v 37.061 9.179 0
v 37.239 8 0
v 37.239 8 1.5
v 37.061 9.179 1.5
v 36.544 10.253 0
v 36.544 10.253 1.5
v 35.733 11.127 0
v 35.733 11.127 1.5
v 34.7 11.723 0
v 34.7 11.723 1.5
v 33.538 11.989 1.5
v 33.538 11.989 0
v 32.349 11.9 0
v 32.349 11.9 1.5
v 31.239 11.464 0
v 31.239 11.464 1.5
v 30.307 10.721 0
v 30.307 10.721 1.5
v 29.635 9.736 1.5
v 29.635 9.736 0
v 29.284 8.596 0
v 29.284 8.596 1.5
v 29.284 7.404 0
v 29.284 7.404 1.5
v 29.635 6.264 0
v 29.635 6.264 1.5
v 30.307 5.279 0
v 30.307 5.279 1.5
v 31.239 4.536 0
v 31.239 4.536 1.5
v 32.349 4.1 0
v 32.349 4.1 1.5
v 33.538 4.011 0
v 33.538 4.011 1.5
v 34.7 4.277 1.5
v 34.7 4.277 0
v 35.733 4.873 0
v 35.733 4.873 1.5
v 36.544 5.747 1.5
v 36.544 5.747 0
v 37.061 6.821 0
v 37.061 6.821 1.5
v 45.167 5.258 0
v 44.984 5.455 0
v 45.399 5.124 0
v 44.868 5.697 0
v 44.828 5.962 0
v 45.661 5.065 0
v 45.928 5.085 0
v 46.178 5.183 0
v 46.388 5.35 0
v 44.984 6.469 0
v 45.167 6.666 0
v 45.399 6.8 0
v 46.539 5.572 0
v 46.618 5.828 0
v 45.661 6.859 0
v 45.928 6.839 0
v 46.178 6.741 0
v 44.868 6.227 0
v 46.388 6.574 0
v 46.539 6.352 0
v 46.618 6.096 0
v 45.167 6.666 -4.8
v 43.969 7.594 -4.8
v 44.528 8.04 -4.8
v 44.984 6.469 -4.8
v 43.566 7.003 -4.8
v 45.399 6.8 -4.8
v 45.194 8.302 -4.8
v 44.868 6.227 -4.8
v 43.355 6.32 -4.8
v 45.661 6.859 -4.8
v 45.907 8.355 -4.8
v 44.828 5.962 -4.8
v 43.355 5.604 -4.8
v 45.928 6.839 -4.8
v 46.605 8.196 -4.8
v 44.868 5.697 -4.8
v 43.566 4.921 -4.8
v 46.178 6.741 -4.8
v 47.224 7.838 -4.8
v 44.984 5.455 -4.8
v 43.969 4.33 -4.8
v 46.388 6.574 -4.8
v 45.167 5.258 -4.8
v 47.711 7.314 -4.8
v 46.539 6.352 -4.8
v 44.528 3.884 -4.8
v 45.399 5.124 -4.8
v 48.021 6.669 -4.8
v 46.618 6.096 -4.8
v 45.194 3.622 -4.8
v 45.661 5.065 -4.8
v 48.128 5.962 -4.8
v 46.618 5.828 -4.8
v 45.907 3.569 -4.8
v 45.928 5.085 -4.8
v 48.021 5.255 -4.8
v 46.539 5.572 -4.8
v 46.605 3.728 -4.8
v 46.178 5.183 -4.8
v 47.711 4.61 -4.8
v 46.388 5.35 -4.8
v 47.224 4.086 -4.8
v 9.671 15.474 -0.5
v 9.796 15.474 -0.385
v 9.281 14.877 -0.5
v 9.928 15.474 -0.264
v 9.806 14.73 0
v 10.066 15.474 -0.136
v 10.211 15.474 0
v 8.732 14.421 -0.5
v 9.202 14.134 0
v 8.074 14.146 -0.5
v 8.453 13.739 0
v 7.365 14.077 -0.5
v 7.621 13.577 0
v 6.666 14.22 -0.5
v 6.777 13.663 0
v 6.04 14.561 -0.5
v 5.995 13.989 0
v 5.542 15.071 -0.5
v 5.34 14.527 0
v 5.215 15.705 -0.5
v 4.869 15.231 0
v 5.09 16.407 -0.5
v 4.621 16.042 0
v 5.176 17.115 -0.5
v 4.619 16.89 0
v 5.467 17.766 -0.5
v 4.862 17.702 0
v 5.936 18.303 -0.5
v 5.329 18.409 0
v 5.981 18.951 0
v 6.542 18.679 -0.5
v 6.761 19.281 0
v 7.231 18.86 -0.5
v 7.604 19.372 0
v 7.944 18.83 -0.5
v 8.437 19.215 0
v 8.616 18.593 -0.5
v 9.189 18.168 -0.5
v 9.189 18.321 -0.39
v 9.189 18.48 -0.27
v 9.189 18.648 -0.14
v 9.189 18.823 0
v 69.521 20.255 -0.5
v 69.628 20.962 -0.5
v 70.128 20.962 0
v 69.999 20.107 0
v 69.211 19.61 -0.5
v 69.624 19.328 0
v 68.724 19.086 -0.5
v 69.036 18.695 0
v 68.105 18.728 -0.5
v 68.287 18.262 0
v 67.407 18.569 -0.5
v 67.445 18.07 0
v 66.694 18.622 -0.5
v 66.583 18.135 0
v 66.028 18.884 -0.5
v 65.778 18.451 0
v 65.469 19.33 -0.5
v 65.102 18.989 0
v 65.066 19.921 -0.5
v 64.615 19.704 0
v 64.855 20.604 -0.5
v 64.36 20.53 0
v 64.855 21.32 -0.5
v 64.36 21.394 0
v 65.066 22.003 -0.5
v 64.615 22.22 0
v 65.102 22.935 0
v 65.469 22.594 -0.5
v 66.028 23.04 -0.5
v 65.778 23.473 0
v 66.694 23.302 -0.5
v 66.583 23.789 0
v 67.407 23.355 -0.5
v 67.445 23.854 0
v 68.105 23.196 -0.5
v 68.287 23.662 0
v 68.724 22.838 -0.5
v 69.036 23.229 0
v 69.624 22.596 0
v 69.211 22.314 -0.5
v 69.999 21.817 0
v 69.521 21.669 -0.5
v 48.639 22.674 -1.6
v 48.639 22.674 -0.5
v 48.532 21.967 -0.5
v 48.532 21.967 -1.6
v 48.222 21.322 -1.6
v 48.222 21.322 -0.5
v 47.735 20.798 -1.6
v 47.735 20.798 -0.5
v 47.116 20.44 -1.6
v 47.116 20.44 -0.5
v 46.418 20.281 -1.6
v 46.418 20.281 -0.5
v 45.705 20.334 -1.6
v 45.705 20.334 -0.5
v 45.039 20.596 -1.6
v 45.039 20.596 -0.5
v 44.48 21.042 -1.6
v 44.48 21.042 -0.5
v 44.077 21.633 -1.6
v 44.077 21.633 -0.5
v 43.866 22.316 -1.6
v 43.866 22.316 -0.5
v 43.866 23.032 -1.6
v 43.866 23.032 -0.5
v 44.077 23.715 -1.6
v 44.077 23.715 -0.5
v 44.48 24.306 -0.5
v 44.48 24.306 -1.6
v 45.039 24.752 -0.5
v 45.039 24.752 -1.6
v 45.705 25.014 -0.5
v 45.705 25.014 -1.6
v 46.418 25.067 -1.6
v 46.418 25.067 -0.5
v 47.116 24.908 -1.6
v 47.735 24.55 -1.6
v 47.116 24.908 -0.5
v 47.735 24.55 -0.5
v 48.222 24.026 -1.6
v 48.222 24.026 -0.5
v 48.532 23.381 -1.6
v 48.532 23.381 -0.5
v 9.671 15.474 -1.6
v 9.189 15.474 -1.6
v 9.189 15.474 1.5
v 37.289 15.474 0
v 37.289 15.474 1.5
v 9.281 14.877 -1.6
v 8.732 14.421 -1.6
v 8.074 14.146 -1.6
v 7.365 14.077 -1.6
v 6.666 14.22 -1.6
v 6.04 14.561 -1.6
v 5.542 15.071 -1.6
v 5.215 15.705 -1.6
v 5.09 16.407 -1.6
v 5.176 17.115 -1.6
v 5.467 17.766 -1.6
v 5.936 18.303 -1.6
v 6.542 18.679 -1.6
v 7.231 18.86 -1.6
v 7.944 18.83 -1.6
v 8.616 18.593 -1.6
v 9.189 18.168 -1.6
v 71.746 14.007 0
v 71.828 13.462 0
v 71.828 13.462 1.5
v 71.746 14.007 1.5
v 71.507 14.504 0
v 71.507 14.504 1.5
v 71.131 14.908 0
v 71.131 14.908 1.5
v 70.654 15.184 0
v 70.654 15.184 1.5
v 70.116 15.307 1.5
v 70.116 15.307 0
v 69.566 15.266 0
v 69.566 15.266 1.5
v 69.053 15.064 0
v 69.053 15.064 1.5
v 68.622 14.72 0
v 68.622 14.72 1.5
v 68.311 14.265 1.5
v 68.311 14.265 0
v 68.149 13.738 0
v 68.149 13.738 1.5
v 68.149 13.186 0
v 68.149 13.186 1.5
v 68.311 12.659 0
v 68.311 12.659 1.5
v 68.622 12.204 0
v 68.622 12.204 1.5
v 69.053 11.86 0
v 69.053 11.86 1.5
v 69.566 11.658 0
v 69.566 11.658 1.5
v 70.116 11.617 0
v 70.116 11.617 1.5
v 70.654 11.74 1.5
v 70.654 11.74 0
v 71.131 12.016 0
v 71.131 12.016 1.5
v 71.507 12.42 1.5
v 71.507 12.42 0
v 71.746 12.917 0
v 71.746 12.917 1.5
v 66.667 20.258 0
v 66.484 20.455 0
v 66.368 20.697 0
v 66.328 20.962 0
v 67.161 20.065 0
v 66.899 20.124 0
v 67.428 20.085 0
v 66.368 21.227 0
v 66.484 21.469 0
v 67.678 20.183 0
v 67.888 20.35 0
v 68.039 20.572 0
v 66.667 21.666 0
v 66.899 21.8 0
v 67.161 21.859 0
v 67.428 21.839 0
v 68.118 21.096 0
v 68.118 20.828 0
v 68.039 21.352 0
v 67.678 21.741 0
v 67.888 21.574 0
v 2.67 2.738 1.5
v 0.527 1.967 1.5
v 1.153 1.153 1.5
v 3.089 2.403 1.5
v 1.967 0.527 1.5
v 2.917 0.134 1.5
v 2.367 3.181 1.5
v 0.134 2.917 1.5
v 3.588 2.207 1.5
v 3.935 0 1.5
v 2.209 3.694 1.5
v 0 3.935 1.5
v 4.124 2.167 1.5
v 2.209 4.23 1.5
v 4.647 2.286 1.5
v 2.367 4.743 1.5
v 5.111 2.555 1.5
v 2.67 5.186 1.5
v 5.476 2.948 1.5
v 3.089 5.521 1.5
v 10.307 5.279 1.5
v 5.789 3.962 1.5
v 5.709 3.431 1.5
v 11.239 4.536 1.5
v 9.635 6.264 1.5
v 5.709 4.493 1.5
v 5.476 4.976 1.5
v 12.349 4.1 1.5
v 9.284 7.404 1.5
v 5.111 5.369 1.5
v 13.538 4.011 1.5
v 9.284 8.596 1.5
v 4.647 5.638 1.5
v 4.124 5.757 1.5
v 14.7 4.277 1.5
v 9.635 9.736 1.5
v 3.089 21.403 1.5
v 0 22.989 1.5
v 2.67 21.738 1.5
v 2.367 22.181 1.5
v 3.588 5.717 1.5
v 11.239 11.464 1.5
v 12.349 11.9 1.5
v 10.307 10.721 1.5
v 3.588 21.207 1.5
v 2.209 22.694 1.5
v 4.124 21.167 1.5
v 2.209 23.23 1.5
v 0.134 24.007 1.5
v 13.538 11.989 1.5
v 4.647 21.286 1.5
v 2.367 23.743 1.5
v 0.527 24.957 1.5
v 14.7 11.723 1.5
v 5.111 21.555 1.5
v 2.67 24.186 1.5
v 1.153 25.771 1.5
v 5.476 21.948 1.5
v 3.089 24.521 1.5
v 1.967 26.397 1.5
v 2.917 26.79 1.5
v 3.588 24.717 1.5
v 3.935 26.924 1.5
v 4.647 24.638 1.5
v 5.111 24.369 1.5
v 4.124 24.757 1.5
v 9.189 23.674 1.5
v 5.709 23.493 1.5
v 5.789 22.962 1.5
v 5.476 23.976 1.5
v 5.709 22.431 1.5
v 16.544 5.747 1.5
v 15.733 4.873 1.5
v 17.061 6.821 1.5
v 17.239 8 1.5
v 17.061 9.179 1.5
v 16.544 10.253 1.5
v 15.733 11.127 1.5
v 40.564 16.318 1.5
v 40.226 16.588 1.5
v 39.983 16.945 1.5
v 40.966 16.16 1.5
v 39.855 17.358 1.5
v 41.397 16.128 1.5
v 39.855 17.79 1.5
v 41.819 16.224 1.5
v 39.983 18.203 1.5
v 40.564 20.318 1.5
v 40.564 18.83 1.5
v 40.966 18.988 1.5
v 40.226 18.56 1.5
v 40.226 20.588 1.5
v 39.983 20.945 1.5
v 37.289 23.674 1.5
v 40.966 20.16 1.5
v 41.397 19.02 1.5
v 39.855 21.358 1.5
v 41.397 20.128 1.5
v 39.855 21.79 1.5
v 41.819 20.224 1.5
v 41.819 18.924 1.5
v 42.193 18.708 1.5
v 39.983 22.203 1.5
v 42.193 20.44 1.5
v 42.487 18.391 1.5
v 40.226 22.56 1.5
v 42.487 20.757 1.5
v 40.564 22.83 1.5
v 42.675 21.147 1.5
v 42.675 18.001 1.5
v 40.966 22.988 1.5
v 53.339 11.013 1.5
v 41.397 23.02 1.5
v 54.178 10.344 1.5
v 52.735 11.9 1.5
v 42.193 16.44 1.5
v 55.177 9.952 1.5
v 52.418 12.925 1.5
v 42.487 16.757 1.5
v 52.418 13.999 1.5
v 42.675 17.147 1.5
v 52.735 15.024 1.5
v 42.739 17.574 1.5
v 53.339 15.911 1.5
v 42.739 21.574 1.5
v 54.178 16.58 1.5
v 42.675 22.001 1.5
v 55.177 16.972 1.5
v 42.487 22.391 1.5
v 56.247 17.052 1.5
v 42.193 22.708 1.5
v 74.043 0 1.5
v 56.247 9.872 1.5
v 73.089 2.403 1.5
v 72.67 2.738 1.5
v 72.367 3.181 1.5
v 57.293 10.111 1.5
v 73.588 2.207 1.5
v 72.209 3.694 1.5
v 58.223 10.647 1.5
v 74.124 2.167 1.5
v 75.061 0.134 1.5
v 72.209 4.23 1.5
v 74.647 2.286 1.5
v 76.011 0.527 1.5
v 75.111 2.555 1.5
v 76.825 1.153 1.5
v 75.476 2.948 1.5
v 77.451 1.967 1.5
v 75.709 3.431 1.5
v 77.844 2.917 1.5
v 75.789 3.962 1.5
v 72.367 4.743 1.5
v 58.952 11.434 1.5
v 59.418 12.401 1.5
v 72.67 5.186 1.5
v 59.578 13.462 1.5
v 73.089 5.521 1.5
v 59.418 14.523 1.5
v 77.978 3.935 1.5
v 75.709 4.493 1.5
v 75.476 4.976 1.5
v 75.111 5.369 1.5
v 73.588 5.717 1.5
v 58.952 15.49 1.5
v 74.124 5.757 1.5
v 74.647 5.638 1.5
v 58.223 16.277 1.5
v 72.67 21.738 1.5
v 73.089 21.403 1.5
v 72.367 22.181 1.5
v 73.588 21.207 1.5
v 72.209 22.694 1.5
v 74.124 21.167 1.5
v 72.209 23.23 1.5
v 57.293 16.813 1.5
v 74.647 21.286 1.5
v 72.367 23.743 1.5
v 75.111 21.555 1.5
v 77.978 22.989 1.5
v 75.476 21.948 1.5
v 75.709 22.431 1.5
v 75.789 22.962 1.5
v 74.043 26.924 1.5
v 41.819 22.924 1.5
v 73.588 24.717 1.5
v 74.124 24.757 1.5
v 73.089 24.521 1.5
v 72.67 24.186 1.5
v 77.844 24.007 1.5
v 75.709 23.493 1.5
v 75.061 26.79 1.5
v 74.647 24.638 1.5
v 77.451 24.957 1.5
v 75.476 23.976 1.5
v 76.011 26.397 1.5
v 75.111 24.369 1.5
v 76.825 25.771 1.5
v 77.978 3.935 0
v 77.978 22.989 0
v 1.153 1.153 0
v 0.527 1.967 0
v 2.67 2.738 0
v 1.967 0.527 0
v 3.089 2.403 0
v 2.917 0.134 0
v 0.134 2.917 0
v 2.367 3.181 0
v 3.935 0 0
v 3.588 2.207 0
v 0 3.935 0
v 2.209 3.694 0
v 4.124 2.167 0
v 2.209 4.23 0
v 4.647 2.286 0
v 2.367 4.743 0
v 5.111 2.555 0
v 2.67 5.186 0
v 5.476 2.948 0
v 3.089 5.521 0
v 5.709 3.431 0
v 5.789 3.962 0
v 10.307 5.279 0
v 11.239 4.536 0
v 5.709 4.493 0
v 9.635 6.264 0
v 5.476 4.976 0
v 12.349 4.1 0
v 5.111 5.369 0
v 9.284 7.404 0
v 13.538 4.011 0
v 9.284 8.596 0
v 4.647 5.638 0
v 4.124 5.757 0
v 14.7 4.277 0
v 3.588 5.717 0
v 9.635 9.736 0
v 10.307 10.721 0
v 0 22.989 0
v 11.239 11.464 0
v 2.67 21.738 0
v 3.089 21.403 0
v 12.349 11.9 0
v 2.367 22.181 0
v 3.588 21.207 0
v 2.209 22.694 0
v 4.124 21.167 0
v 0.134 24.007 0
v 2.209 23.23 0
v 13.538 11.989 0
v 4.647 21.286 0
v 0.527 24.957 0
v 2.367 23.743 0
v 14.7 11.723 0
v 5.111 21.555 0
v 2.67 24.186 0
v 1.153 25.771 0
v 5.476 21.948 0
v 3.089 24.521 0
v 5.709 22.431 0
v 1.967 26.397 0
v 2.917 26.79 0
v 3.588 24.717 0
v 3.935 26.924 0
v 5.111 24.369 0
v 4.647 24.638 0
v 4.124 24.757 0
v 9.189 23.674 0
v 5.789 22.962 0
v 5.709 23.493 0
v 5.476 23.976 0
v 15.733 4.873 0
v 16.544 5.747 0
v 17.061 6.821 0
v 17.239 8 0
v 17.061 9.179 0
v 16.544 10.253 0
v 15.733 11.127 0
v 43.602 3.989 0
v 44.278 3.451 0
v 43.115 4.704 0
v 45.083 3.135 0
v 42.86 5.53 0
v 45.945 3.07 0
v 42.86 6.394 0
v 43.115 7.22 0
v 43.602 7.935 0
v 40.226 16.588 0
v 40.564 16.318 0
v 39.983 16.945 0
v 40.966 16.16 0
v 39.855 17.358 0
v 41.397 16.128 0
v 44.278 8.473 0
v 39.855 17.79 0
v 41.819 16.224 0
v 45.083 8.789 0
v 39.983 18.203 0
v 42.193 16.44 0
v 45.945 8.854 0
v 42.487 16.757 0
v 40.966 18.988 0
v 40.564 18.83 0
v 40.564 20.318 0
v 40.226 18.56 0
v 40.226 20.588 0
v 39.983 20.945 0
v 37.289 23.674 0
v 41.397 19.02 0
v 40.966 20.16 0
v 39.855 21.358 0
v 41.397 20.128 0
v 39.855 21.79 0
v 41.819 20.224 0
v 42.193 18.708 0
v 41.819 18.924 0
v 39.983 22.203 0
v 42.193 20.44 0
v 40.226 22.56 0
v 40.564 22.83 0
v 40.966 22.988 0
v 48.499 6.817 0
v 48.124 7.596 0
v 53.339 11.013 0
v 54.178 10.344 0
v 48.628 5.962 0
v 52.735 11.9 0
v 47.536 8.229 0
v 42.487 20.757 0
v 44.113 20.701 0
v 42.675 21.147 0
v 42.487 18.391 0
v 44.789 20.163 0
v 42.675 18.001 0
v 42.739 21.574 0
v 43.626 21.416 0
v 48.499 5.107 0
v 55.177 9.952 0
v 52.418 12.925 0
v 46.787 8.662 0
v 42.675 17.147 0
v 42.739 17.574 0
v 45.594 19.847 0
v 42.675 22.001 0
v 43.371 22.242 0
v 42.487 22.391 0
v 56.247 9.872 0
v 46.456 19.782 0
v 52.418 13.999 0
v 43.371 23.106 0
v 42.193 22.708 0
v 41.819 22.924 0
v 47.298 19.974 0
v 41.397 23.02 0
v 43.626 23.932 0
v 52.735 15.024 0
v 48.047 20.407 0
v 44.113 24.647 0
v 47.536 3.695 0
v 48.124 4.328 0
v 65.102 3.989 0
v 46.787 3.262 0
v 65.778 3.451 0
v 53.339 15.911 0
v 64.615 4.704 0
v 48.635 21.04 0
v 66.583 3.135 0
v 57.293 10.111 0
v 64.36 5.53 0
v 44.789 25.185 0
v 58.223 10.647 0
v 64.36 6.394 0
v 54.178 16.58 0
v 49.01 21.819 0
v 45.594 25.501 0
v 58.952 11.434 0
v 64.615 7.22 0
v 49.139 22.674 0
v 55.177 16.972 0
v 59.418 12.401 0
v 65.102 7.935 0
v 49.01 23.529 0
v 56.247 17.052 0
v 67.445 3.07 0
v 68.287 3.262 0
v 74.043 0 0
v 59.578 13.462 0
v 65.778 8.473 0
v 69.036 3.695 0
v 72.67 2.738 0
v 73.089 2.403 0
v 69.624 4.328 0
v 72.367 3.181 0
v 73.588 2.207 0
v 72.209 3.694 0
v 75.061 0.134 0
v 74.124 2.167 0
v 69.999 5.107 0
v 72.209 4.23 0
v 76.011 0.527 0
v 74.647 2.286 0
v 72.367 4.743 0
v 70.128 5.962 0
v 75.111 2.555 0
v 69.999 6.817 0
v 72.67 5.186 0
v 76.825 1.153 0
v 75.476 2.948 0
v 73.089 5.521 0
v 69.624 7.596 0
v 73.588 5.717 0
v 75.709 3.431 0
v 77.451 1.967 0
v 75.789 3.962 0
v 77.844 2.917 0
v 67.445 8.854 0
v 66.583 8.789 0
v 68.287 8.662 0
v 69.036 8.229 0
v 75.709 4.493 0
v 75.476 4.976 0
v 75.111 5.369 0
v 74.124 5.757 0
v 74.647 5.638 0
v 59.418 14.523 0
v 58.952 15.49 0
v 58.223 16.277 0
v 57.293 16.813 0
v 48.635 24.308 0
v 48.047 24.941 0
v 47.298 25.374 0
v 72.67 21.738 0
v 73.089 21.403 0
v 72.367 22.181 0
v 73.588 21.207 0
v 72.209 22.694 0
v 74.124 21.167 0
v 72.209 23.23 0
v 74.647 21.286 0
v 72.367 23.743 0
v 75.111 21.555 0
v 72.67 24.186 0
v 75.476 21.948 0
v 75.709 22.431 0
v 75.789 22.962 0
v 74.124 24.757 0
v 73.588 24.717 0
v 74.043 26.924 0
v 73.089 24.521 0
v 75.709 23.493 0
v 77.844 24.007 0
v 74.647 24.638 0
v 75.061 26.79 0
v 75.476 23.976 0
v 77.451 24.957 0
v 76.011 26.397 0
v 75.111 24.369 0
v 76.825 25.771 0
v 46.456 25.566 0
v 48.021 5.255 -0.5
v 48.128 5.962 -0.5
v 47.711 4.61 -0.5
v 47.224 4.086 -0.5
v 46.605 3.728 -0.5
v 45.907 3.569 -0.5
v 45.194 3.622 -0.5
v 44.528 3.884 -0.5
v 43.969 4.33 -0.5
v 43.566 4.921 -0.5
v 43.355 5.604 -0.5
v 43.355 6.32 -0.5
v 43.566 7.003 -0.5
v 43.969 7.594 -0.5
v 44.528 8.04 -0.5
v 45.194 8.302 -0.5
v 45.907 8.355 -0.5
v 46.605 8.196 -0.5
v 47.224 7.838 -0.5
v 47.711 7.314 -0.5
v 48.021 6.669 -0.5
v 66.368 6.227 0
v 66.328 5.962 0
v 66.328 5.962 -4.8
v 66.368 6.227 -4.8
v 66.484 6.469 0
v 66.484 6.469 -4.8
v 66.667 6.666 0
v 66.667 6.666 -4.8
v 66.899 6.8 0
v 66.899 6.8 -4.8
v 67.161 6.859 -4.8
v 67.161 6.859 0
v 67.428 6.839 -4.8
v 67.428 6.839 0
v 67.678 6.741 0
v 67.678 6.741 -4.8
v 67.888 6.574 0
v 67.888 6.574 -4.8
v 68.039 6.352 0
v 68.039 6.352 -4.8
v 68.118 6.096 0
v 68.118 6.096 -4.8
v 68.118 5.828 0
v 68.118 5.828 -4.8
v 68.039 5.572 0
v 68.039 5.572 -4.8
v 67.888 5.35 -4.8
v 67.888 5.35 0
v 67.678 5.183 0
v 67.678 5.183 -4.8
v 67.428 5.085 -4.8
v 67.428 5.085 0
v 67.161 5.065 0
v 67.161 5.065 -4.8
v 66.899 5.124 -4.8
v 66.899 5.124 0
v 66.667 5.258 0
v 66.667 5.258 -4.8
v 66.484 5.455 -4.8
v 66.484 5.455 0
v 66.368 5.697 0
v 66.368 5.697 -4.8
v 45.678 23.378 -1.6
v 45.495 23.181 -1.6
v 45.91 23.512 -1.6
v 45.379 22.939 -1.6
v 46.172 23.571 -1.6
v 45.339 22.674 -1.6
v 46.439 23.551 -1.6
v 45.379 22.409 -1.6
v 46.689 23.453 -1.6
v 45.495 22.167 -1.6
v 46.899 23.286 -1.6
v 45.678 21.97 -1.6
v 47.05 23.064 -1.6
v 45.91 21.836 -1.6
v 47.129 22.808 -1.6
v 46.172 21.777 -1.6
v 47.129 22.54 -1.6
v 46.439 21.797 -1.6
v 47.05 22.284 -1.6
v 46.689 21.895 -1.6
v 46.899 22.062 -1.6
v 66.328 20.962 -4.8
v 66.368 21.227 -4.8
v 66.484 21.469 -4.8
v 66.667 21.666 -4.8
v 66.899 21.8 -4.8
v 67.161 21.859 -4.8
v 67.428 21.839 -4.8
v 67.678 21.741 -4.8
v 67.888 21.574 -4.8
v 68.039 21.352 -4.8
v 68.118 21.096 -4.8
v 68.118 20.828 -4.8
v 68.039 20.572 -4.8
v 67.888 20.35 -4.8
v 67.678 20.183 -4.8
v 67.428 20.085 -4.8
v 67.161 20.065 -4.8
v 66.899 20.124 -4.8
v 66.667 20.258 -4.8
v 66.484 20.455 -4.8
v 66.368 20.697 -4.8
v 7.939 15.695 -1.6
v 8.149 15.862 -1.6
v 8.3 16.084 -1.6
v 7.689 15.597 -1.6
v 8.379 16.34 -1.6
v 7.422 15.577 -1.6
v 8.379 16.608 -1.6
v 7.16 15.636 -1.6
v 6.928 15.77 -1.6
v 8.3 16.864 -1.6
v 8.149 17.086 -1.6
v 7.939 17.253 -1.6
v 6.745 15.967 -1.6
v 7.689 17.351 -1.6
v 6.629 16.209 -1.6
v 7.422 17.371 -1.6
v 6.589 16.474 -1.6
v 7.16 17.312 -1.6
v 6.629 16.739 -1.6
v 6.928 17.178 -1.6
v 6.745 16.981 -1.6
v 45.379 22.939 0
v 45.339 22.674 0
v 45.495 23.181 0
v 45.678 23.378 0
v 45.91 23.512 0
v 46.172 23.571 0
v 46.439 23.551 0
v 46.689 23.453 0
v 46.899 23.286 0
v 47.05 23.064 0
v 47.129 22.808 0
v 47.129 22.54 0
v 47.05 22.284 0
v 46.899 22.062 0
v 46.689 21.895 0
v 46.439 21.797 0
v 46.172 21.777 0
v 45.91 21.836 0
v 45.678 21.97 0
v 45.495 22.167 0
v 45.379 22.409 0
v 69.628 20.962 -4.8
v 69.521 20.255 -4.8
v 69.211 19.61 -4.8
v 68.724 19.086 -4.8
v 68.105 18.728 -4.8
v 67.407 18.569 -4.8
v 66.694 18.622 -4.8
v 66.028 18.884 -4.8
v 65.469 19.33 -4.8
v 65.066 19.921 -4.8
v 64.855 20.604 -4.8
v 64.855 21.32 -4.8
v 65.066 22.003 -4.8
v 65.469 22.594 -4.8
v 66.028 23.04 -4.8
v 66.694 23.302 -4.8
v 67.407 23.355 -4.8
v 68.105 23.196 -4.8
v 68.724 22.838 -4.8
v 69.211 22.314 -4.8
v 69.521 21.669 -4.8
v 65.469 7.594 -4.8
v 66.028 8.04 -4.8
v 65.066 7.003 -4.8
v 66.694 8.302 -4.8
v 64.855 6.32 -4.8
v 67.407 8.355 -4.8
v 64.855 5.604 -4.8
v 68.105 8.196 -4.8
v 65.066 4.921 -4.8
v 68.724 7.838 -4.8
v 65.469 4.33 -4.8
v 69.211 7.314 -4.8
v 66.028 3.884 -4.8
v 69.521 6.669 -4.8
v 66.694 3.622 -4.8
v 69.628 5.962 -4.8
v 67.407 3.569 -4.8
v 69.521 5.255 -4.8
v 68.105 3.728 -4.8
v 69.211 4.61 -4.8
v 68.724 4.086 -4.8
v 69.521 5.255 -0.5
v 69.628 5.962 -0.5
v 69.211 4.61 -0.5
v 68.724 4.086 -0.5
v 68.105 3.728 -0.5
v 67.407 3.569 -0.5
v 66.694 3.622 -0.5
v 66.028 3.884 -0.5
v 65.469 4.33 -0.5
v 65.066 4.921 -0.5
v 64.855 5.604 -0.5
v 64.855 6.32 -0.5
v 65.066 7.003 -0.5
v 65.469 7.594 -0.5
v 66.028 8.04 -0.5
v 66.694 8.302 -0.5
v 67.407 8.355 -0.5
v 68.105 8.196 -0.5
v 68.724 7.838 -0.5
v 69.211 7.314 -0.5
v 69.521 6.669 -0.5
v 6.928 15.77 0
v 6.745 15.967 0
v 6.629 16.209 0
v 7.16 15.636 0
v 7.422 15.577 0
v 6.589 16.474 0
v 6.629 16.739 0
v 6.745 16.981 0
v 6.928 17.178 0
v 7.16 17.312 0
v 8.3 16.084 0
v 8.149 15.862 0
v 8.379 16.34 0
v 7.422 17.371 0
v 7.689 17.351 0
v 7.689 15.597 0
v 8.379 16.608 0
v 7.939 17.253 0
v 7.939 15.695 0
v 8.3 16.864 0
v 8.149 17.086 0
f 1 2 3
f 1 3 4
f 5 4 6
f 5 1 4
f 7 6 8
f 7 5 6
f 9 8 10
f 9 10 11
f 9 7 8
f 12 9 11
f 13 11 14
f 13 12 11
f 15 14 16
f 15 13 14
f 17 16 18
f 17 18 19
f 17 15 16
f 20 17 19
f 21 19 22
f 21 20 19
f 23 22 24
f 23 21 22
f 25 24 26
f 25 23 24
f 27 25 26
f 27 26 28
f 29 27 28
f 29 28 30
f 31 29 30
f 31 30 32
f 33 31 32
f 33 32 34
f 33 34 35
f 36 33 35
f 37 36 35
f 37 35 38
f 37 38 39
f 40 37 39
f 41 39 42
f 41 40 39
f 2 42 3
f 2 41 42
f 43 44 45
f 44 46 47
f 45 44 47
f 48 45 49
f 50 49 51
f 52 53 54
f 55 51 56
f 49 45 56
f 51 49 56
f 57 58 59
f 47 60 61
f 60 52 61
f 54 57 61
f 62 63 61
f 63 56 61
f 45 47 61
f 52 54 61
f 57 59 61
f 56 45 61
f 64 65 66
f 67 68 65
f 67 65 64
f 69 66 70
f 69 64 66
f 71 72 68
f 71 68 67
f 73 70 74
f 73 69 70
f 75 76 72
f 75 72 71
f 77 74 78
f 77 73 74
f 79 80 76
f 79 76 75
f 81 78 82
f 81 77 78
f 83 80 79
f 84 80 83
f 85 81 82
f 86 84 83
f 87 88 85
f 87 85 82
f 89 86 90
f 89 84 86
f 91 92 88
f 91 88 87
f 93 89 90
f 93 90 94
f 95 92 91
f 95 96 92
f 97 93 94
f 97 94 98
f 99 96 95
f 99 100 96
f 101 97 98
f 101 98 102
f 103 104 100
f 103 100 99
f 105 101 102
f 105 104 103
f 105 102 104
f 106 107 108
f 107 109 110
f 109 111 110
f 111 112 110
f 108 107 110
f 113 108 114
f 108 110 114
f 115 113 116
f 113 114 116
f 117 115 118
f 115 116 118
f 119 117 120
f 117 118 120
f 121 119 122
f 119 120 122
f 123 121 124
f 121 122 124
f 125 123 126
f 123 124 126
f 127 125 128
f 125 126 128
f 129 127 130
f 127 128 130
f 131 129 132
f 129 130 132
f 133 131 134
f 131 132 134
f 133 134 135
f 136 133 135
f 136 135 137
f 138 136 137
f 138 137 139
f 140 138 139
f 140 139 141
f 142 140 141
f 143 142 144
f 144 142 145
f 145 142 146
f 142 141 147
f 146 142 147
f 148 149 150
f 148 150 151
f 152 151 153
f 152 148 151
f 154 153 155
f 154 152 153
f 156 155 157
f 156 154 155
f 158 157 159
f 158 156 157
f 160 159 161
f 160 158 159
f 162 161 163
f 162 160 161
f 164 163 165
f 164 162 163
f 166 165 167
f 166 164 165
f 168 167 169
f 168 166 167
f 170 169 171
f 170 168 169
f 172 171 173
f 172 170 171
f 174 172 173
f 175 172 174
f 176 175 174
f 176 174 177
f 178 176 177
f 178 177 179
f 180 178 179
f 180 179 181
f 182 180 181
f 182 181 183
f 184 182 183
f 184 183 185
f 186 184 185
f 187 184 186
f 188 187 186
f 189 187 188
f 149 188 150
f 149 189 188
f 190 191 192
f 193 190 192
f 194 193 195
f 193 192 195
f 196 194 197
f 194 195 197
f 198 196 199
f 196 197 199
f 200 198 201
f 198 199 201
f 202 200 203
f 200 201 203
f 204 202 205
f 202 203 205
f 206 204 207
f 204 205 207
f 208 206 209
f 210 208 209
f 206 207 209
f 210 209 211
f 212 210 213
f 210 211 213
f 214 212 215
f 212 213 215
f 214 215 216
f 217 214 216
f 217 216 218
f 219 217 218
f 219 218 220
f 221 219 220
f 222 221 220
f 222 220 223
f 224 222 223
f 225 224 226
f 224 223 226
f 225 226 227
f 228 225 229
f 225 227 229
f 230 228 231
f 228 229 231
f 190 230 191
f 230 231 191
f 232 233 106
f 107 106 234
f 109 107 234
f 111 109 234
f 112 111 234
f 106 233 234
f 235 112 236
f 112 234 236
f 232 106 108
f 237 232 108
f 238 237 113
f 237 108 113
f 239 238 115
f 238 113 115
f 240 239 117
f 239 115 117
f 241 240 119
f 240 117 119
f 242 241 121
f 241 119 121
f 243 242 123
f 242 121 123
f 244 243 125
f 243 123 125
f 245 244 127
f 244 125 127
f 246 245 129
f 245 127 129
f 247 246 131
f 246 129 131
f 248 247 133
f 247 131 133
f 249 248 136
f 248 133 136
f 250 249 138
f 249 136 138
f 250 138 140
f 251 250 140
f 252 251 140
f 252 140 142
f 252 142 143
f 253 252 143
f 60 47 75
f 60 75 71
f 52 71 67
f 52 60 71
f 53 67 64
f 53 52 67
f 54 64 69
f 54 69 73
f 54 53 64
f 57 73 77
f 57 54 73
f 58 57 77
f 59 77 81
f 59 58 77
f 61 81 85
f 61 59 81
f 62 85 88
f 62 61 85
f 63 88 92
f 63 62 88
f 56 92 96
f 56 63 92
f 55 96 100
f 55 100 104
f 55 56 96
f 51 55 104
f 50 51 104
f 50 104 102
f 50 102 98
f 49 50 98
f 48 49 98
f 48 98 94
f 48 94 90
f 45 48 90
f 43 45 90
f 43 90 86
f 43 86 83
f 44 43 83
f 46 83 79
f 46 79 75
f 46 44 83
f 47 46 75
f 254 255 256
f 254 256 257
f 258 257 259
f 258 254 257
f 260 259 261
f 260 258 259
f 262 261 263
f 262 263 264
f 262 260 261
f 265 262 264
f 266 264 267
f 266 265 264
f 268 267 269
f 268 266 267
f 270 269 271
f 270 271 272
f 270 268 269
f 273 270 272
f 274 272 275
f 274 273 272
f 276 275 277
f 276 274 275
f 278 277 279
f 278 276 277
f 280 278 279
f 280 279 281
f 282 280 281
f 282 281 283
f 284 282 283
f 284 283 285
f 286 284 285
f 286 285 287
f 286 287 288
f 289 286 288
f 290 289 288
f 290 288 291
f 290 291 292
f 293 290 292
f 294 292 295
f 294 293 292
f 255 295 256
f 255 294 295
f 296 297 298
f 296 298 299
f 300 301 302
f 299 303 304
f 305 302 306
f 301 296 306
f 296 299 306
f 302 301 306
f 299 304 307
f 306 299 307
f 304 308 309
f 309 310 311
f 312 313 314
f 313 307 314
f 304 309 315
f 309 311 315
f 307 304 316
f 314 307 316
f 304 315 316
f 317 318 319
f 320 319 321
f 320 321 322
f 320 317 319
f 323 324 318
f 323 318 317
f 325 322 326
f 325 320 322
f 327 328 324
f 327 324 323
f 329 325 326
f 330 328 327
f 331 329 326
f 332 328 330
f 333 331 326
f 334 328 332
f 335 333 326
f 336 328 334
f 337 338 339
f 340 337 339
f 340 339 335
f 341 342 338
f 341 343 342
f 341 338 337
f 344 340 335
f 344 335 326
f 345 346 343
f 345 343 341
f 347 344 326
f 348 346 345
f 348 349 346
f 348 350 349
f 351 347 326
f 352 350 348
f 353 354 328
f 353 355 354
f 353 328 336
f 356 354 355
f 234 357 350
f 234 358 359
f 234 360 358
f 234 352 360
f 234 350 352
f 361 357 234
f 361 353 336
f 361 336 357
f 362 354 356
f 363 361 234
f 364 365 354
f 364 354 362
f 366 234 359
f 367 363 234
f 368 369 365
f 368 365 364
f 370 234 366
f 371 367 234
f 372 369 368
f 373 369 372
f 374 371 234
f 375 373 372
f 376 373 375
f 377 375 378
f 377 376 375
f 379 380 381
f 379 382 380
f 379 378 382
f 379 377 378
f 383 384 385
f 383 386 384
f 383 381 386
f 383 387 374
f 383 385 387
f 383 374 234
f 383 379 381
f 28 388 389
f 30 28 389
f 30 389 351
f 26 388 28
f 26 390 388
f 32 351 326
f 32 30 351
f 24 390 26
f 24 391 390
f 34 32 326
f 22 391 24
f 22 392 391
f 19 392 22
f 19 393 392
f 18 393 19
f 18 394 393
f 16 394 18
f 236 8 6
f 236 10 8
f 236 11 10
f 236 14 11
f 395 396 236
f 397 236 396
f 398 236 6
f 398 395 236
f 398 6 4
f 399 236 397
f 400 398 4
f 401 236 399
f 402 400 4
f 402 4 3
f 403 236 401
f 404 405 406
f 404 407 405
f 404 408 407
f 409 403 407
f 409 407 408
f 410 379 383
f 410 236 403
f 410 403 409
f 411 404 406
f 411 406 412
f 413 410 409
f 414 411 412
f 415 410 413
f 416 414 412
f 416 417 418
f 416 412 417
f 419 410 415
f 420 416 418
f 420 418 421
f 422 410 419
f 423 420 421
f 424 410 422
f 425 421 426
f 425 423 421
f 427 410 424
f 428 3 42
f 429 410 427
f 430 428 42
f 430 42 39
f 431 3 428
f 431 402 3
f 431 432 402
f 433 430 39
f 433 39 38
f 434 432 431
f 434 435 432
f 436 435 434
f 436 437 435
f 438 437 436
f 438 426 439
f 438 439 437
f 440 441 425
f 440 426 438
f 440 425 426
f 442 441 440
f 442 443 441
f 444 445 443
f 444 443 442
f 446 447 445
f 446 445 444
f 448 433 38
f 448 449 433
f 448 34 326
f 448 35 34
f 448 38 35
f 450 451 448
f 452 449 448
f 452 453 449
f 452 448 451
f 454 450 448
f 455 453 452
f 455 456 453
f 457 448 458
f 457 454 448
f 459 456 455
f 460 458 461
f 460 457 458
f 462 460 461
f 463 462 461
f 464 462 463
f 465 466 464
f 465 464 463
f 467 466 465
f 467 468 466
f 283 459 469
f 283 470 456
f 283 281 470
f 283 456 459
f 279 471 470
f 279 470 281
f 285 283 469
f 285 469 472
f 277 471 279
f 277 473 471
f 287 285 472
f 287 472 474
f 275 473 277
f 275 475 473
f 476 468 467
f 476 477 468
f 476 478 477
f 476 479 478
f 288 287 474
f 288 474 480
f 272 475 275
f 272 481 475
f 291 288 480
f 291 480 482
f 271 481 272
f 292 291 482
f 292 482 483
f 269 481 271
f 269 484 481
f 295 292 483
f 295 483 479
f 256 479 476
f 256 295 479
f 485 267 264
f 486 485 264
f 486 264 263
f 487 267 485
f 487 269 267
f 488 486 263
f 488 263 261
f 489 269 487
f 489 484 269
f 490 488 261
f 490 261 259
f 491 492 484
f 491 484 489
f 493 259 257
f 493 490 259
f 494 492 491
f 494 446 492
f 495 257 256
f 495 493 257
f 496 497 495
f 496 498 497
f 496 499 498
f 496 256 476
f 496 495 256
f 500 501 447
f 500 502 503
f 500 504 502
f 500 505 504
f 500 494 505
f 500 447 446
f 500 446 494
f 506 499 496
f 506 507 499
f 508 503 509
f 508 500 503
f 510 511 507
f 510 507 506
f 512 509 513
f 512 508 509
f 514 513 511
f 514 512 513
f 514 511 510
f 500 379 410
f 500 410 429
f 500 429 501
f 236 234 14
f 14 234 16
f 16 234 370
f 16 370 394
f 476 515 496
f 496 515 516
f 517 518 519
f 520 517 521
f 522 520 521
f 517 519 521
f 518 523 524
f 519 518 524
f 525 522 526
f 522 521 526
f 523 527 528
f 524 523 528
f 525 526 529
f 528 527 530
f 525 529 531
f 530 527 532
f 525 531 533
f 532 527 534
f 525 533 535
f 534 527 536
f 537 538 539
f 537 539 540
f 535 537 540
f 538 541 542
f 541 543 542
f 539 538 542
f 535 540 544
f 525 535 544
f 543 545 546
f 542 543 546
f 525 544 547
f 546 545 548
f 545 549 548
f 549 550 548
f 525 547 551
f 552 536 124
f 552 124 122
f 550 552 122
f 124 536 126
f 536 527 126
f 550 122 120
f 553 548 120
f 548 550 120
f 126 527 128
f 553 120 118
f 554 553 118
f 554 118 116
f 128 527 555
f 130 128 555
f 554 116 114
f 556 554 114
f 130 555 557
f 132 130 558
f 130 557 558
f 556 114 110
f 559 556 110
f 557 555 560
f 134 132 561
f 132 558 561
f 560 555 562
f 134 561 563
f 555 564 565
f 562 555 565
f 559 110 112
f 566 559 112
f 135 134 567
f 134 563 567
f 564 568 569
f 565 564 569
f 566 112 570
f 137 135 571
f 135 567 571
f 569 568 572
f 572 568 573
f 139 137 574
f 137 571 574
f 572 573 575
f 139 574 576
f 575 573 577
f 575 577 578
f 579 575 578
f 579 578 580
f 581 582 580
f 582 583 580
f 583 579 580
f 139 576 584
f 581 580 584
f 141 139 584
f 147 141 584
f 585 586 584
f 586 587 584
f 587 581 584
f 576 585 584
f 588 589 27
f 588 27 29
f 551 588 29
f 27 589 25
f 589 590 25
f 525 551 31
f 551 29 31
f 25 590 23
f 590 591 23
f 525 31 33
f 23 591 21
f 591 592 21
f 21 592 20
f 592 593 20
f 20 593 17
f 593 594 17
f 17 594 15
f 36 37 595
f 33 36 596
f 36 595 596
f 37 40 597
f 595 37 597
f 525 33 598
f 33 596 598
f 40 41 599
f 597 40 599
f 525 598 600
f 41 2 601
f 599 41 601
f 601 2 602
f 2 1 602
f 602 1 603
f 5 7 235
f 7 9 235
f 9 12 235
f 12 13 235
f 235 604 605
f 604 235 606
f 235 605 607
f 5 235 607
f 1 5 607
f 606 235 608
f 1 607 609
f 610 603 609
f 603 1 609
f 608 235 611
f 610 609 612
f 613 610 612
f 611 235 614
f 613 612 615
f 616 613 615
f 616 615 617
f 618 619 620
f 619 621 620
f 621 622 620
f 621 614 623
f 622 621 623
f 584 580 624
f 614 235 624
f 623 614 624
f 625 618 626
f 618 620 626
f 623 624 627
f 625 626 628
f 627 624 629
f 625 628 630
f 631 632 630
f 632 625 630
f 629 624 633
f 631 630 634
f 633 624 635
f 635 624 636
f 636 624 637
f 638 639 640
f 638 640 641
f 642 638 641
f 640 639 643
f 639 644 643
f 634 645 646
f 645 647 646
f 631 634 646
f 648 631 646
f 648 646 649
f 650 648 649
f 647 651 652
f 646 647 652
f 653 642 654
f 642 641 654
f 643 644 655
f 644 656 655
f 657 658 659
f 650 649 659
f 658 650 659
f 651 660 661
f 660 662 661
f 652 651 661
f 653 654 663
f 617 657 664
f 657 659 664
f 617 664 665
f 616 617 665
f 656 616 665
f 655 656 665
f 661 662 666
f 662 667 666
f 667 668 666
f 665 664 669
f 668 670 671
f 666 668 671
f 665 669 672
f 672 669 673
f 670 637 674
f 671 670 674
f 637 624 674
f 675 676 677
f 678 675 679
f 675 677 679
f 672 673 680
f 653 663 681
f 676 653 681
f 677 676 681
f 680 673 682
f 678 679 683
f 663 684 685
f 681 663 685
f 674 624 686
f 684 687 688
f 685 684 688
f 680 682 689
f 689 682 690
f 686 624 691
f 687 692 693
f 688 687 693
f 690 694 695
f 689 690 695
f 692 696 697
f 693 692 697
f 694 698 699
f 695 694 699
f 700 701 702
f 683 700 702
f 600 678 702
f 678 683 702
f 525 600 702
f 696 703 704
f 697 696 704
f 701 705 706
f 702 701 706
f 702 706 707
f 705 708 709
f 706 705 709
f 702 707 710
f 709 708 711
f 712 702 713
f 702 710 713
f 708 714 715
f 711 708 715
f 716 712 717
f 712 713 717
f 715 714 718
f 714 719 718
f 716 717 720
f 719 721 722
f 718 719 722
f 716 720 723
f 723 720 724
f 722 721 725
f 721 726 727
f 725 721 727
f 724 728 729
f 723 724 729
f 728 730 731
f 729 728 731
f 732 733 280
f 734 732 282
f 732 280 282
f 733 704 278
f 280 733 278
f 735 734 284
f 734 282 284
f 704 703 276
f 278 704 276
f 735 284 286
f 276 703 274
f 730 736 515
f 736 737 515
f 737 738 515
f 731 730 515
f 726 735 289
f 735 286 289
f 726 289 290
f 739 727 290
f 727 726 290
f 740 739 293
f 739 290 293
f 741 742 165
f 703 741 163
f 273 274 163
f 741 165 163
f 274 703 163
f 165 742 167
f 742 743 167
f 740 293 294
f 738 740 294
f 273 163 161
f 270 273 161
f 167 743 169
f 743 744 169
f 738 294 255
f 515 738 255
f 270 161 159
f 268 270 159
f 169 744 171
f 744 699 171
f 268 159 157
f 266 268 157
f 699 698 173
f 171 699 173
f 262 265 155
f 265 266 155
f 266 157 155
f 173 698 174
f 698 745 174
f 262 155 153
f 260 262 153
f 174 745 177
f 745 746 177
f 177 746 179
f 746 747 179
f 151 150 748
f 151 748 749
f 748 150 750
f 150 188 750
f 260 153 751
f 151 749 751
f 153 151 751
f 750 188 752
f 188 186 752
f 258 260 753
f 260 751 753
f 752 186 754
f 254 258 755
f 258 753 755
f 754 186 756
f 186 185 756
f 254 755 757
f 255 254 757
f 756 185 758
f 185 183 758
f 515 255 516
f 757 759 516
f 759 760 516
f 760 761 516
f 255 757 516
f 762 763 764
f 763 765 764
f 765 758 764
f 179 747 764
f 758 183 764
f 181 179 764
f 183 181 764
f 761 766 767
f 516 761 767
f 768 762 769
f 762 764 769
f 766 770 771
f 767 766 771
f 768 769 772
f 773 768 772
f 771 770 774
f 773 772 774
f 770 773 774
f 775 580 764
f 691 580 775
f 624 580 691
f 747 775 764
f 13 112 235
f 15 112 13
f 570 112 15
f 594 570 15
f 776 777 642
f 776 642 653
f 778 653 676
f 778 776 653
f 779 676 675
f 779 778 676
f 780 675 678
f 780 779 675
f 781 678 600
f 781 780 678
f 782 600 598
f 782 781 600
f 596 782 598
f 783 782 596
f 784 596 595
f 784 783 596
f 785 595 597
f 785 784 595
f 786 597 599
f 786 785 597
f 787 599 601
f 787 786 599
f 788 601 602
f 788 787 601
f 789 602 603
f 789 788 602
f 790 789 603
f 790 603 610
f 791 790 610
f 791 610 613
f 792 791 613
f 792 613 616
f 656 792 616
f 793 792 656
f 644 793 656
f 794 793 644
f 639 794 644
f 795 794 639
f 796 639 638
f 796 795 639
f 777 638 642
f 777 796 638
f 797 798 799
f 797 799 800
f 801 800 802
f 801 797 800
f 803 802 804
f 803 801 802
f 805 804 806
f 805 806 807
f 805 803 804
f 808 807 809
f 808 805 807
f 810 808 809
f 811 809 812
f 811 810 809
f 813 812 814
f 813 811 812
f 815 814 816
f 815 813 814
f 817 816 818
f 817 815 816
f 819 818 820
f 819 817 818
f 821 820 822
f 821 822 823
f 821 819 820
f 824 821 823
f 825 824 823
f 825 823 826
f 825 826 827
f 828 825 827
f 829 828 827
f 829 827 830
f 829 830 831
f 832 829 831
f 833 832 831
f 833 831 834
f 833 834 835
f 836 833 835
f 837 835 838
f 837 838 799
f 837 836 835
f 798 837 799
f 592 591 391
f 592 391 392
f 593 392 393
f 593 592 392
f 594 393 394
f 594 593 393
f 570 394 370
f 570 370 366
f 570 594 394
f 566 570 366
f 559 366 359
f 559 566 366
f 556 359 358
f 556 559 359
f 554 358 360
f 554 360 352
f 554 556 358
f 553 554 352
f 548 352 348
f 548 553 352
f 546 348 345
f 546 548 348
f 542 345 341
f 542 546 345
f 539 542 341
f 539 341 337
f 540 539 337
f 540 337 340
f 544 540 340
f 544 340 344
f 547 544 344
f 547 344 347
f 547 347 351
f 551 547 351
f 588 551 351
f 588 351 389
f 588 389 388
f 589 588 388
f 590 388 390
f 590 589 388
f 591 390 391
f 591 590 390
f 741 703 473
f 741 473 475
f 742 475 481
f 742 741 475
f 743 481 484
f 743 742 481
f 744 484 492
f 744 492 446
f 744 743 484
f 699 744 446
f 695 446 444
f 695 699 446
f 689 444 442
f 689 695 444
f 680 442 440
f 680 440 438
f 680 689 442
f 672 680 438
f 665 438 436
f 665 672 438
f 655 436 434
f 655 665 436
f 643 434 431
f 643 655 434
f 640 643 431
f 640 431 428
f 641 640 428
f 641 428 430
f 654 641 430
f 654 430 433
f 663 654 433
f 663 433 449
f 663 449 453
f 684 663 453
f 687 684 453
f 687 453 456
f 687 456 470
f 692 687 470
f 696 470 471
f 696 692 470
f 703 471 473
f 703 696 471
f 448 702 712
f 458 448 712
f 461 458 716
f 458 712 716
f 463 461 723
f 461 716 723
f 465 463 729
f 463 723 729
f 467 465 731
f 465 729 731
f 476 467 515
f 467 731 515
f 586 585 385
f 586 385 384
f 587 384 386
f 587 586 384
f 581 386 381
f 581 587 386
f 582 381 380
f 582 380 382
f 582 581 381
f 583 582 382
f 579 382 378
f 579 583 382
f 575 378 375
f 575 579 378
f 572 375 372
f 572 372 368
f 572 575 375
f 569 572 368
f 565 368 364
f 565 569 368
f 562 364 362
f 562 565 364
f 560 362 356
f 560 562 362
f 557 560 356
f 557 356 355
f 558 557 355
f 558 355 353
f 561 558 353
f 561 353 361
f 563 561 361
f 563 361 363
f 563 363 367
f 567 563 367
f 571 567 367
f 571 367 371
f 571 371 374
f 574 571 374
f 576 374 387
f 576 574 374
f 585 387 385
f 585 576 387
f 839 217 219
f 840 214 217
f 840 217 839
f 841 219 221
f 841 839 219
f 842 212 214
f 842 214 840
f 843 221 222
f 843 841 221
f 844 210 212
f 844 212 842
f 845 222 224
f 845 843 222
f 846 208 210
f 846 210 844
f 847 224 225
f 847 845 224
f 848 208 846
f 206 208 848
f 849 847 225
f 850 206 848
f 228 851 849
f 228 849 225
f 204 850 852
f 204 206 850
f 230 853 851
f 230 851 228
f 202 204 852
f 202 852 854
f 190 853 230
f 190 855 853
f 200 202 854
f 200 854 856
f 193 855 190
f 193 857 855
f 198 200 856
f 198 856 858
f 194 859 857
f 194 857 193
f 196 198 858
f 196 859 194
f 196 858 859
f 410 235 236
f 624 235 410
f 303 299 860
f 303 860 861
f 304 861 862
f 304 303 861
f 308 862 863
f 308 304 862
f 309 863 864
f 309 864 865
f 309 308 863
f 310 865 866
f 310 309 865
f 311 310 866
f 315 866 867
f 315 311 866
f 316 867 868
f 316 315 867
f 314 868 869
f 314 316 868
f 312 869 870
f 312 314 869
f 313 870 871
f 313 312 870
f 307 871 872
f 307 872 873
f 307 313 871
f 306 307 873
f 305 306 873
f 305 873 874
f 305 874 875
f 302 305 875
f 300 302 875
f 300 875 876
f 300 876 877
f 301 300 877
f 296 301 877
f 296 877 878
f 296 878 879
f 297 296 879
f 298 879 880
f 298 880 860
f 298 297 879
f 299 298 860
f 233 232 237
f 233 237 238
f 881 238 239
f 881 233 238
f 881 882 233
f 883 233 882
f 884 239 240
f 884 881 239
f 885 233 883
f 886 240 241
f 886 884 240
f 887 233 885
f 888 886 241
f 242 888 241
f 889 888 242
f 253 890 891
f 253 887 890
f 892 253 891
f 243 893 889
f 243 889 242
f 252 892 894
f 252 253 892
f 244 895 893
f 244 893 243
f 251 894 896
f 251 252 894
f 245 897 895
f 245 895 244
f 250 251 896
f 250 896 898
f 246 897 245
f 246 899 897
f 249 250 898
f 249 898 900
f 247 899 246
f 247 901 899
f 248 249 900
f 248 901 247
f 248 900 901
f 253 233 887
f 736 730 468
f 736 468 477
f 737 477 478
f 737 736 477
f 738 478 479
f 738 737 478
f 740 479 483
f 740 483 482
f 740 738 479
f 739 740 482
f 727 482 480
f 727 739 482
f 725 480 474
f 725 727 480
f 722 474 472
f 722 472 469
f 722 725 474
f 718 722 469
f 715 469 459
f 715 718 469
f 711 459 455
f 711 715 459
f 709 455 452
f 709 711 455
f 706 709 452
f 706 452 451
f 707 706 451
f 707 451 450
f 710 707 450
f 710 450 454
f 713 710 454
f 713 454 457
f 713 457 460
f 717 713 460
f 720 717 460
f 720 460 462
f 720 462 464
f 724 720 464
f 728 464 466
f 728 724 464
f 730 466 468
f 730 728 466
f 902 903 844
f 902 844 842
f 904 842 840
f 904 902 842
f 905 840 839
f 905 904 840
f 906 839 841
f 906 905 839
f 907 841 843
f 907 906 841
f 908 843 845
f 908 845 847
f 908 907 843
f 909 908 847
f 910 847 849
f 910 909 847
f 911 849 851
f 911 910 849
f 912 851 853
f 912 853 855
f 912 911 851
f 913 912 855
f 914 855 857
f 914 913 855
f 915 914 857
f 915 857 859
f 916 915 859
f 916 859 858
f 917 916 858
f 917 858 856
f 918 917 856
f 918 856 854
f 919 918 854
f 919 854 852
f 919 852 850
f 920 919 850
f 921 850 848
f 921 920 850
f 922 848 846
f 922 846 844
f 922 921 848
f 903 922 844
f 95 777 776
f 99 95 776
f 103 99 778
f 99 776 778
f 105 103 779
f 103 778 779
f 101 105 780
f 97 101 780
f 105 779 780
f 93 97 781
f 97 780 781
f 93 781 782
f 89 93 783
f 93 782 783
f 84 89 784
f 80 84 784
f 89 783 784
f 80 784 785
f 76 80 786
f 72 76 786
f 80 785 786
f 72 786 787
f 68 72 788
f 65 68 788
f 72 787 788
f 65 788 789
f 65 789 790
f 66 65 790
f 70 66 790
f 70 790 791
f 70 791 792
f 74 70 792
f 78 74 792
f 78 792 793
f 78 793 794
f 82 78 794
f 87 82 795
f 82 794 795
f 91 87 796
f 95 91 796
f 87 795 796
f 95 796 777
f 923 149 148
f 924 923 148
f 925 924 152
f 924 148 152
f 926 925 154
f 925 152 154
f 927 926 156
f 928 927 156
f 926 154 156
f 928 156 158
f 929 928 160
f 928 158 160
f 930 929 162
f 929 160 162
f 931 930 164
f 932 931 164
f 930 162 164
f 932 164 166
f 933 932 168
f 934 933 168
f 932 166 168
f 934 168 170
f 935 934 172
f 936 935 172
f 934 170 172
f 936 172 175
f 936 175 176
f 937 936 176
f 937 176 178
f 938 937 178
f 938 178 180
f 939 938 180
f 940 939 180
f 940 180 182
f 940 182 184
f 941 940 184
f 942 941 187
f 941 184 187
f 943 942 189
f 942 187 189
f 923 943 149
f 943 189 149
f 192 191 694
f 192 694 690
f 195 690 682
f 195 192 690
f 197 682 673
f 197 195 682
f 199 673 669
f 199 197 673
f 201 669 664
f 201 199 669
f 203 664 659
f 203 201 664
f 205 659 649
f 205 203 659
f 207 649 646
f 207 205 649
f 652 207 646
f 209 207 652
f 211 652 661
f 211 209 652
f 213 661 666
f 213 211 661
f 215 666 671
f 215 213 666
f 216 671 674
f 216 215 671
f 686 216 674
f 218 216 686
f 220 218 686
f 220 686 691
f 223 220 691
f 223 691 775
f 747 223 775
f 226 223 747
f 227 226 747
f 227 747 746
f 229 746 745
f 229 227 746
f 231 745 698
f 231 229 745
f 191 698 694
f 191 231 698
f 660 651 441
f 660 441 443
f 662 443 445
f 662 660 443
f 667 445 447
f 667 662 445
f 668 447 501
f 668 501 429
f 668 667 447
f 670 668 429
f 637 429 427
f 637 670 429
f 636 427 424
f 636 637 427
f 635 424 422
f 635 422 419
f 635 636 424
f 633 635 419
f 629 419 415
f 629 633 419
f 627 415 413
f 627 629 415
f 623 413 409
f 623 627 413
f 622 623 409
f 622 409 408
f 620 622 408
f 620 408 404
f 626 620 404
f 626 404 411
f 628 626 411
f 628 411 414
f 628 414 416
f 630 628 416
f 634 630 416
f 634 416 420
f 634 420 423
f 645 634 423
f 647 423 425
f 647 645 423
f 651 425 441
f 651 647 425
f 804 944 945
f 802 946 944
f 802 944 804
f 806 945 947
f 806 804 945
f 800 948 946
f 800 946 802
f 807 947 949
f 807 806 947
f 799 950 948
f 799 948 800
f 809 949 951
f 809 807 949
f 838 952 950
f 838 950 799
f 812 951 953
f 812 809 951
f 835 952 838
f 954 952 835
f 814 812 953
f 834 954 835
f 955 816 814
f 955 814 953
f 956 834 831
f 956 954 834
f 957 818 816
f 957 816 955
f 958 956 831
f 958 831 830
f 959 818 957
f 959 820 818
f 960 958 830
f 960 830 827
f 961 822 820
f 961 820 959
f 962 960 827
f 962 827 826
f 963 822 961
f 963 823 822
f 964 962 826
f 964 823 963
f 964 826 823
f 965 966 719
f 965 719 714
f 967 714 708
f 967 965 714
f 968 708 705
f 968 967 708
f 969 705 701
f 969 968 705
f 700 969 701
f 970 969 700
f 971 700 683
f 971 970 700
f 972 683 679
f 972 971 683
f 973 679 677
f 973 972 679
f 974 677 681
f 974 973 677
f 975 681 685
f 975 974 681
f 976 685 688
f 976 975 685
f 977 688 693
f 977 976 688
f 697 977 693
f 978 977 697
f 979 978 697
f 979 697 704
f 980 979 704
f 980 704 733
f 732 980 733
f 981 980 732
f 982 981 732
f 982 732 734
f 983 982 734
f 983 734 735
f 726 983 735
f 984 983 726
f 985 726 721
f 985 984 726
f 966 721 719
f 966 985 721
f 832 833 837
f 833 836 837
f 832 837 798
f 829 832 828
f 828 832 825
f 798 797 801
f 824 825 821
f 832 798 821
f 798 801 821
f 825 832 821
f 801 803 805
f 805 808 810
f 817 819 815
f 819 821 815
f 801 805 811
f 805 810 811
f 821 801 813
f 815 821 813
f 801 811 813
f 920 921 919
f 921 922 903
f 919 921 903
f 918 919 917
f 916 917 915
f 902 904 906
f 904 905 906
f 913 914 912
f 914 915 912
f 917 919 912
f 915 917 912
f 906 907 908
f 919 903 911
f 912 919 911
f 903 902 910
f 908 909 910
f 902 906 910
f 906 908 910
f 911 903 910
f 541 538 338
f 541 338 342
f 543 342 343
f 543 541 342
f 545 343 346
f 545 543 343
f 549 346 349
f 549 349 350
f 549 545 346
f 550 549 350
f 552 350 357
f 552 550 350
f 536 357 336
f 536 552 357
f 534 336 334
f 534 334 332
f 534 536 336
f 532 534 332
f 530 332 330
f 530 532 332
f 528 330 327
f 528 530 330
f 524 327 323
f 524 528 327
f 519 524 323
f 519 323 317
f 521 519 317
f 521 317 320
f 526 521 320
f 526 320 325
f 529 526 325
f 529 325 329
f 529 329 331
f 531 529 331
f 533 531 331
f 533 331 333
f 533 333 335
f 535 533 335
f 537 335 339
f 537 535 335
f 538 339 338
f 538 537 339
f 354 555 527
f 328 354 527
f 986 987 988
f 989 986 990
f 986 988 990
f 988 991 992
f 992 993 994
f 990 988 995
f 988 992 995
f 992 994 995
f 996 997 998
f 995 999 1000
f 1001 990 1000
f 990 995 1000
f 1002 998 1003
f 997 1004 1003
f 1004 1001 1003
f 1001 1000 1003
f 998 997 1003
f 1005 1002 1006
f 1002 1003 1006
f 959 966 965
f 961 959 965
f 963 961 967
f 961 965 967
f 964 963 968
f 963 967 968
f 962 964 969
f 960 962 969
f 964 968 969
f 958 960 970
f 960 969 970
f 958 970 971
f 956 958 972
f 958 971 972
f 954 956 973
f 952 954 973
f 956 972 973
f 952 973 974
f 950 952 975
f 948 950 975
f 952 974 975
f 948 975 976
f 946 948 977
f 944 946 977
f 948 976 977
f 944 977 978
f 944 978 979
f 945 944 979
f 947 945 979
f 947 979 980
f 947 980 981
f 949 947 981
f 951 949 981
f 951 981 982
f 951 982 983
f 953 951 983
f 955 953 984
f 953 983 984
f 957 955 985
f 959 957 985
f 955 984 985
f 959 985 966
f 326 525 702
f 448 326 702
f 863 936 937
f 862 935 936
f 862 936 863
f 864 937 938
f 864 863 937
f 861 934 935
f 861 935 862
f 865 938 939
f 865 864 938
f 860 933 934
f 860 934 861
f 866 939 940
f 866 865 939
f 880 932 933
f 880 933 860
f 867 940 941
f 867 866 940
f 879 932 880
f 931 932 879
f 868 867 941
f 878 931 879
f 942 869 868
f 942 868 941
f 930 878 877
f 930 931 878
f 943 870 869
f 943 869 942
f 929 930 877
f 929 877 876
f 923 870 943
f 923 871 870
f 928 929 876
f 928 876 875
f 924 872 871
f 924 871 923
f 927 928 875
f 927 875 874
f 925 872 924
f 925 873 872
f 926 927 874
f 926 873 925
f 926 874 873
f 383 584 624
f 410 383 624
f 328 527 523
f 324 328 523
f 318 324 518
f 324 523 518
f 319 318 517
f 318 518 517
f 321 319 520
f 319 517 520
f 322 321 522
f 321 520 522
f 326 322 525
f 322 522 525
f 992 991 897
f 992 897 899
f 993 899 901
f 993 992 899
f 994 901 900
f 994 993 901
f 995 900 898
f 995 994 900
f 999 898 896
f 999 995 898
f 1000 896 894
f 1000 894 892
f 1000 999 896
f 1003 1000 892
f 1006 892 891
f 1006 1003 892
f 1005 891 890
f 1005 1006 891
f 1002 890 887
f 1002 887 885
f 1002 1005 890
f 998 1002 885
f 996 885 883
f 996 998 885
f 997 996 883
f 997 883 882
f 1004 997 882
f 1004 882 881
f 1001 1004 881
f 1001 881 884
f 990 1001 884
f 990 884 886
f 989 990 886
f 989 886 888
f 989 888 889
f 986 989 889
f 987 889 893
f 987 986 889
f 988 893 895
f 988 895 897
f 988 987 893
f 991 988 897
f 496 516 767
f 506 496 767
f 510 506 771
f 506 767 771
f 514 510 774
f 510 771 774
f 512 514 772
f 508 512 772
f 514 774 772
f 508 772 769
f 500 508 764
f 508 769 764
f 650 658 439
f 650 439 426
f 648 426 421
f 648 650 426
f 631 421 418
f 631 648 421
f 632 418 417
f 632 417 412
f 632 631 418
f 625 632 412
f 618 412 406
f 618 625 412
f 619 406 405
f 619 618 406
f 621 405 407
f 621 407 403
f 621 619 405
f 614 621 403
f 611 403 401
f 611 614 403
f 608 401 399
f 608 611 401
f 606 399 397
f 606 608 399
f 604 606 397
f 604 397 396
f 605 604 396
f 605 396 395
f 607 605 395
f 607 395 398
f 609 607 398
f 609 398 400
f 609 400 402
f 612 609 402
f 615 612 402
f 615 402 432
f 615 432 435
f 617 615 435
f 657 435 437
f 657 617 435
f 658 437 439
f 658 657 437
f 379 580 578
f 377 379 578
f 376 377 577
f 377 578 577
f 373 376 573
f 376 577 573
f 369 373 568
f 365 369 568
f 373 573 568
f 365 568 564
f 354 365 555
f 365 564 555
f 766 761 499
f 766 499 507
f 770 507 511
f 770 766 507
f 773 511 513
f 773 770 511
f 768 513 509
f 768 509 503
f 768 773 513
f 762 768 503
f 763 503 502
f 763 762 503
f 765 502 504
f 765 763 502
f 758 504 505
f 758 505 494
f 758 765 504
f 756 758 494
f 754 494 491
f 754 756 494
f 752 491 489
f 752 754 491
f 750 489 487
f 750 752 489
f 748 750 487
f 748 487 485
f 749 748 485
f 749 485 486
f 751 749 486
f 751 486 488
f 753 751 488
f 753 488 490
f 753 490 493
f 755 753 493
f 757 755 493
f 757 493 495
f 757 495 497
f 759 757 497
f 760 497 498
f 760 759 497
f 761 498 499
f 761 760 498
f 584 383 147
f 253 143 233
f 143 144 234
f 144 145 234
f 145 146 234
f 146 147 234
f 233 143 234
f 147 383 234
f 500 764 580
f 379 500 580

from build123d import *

# Parameters (mm, degrees)
SKETCH2_R           = 1.8
SKETCH2_R_2         = 3.6
SKETCH2_R_3         = 4
SKETCH2_R_4         = 1.45
SKETCH2_R_5         = 1.85
SKETCH2_W           = 28.1
SKETCH2_H           = 8.2
BOSS_EXTRUDE2_DEPTH = 1.5
SKETCH3_R           = 2.4
SKETCH3_R_2         = 0.9
BOSS_EXTRUDE3_DEPTH = 1.6
SKETCH4_R           = 2.4
SKETCH4_R_2         = 0.9
BOSS_EXTRUDE4_DEPTH = 4.8
CHAMFER1_SIZE       = 0.5


with BuildPart() as part:
    # Sketch2 → Boss-Extrude2 (new body)
    with BuildSketch(Plane.XY):
        with BuildLine():
            Line((0, 22.989), (0, 3.935))
            ThreePointArc((0, 3.935), (1.152534816, 1.152534816), (3.935, 0))
            Line((3.935, 0), (74.043, 0))
            ThreePointArc((74.043, 0), (76.825465184, 1.152534816), (77.978, 3.935))
            Line((77.978, 3.935), (77.978, 22.989))
            ThreePointArc((77.978, 22.989), (76.825465184, 25.771465184), (74.043, 26.924))
            Line((74.043, 26.924), (3.935, 26.924))
            ThreePointArc((3.935, 26.924), (1.152534816, 25.771465184), (0, 22.989))
        make_face()
        with Locations((3.989, 22.962)):
            Circle(SKETCH2_R, mode=Mode.SUBTRACT)
        with Locations((73.989, 22.962)):
            Circle(SKETCH2_R, mode=Mode.SUBTRACT)
        with Locations((3.989, 3.962)):
            Circle(SKETCH2_R, mode=Mode.SUBTRACT)
        with Locations((73.989, 3.962)):
            Circle(SKETCH2_R, mode=Mode.SUBTRACT)
        with Locations((55.978, 13.462)):
            Circle(SKETCH2_R_2, mode=Mode.SUBTRACT)
        with Locations((13.239, 8)):
            Circle(SKETCH2_R_3, mode=Mode.SUBTRACT)
        with Locations((33.239, 8)):
            Circle(SKETCH2_R_3, mode=Mode.SUBTRACT)
        with Locations((41.289, 21.574)):
            Circle(SKETCH2_R_4, mode=Mode.SUBTRACT)
        with Locations((41.289, 17.574)):
            Circle(SKETCH2_R_4, mode=Mode.SUBTRACT)
        with Locations((69.978, 13.462)):
            Circle(SKETCH2_R_5, mode=Mode.SUBTRACT)
        with Locations((23.239, 19.574)):
            Rectangle(SKETCH2_W, SKETCH2_H, mode=Mode.SUBTRACT)
    extrude(amount=BOSS_EXTRUDE2_DEPTH)

    # Sketch3 → Boss-Extrude3 (add)
    # profile 1 of 2: a face of its own
    with BuildSketch(Plane(origin=(0, 0, 0), x_dir=(-1, 0, 0), z_dir=(0, 0, -1))):
        with Locations(Location((-46.239, 22.674, 0), (0, 0, 180))):
            Circle(SKETCH3_R)
        with Locations((-46.239, 22.674)):
            Circle(SKETCH3_R_2, mode=Mode.SUBTRACT)
    # profile 2 of 2: a face of its own
    with BuildSketch(Plane(origin=(0, 0, 0), x_dir=(-1, 0, 0), z_dir=(0, 0, -1))):
        with BuildLine():
            Line((-9.189, 15.474), (-9.670742423, 15.474))
            ThreePointArc((-9.670742423, 15.474), (-5.126472799, 16.051548555), (-9.189, 18.168107435))
            Line((-9.189, 18.168107435), (-9.189, 15.474))
        make_face()
        with Locations((-7.489, 16.474)):
            Circle(SKETCH3_R_2, mode=Mode.SUBTRACT)
    extrude(amount=BOSS_EXTRUDE3_DEPTH)

    # Sketch4 → Boss-Extrude4 (add)
    # profile 1 of 3: a face of its own
    with BuildSketch(Plane(origin=(0, 0, 0), x_dir=(-1, 0, 0), z_dir=(0, 0, -1))):
        with Locations(Location((-67.228, 20.962, 0), (0, 0, 180))):
            Circle(SKETCH4_R)
        with Locations((-67.228, 20.962)):
            Circle(SKETCH4_R_2, mode=Mode.SUBTRACT)
    # profile 2 of 3: a face of its own
    with BuildSketch(Plane(origin=(0, 0, 0), x_dir=(-1, 0, 0), z_dir=(0, 0, -1))):
        with Locations(Location((-67.228, 5.962, 0), (0, 0, 180))):
            Circle(SKETCH4_R)
        with Locations((-67.228, 5.962)):
            Circle(SKETCH4_R_2, mode=Mode.SUBTRACT)
    # profile 3 of 3: a face of its own
    with BuildSketch(Plane(origin=(0, 0, 0), x_dir=(-1, 0, 0), z_dir=(0, 0, -1))):
        with Locations(Location((-45.728, 5.962, 0), (0, 0, 180))):
            Circle(SKETCH4_R)
        with Locations((-45.728, 5.962)):
            Circle(SKETCH4_R_2, mode=Mode.SUBTRACT)
    extrude(amount=BOSS_EXTRUDE4_DEPTH)

    # Chamfer1
    chamfer1_edges = [part.edges().sort_by_distance(p)[0] for p in [
        (5.126472799, 16.051548555, 0),
        (43.839, 22.674, 0),
        (64.828, 20.962, 0),
        (64.828, 5.962, 0),
        (43.328, 5.962, 0),
    ]]
    chamfer(chamfer1_edges, length=CHAMFER1_SIZE)


solid = part.part
